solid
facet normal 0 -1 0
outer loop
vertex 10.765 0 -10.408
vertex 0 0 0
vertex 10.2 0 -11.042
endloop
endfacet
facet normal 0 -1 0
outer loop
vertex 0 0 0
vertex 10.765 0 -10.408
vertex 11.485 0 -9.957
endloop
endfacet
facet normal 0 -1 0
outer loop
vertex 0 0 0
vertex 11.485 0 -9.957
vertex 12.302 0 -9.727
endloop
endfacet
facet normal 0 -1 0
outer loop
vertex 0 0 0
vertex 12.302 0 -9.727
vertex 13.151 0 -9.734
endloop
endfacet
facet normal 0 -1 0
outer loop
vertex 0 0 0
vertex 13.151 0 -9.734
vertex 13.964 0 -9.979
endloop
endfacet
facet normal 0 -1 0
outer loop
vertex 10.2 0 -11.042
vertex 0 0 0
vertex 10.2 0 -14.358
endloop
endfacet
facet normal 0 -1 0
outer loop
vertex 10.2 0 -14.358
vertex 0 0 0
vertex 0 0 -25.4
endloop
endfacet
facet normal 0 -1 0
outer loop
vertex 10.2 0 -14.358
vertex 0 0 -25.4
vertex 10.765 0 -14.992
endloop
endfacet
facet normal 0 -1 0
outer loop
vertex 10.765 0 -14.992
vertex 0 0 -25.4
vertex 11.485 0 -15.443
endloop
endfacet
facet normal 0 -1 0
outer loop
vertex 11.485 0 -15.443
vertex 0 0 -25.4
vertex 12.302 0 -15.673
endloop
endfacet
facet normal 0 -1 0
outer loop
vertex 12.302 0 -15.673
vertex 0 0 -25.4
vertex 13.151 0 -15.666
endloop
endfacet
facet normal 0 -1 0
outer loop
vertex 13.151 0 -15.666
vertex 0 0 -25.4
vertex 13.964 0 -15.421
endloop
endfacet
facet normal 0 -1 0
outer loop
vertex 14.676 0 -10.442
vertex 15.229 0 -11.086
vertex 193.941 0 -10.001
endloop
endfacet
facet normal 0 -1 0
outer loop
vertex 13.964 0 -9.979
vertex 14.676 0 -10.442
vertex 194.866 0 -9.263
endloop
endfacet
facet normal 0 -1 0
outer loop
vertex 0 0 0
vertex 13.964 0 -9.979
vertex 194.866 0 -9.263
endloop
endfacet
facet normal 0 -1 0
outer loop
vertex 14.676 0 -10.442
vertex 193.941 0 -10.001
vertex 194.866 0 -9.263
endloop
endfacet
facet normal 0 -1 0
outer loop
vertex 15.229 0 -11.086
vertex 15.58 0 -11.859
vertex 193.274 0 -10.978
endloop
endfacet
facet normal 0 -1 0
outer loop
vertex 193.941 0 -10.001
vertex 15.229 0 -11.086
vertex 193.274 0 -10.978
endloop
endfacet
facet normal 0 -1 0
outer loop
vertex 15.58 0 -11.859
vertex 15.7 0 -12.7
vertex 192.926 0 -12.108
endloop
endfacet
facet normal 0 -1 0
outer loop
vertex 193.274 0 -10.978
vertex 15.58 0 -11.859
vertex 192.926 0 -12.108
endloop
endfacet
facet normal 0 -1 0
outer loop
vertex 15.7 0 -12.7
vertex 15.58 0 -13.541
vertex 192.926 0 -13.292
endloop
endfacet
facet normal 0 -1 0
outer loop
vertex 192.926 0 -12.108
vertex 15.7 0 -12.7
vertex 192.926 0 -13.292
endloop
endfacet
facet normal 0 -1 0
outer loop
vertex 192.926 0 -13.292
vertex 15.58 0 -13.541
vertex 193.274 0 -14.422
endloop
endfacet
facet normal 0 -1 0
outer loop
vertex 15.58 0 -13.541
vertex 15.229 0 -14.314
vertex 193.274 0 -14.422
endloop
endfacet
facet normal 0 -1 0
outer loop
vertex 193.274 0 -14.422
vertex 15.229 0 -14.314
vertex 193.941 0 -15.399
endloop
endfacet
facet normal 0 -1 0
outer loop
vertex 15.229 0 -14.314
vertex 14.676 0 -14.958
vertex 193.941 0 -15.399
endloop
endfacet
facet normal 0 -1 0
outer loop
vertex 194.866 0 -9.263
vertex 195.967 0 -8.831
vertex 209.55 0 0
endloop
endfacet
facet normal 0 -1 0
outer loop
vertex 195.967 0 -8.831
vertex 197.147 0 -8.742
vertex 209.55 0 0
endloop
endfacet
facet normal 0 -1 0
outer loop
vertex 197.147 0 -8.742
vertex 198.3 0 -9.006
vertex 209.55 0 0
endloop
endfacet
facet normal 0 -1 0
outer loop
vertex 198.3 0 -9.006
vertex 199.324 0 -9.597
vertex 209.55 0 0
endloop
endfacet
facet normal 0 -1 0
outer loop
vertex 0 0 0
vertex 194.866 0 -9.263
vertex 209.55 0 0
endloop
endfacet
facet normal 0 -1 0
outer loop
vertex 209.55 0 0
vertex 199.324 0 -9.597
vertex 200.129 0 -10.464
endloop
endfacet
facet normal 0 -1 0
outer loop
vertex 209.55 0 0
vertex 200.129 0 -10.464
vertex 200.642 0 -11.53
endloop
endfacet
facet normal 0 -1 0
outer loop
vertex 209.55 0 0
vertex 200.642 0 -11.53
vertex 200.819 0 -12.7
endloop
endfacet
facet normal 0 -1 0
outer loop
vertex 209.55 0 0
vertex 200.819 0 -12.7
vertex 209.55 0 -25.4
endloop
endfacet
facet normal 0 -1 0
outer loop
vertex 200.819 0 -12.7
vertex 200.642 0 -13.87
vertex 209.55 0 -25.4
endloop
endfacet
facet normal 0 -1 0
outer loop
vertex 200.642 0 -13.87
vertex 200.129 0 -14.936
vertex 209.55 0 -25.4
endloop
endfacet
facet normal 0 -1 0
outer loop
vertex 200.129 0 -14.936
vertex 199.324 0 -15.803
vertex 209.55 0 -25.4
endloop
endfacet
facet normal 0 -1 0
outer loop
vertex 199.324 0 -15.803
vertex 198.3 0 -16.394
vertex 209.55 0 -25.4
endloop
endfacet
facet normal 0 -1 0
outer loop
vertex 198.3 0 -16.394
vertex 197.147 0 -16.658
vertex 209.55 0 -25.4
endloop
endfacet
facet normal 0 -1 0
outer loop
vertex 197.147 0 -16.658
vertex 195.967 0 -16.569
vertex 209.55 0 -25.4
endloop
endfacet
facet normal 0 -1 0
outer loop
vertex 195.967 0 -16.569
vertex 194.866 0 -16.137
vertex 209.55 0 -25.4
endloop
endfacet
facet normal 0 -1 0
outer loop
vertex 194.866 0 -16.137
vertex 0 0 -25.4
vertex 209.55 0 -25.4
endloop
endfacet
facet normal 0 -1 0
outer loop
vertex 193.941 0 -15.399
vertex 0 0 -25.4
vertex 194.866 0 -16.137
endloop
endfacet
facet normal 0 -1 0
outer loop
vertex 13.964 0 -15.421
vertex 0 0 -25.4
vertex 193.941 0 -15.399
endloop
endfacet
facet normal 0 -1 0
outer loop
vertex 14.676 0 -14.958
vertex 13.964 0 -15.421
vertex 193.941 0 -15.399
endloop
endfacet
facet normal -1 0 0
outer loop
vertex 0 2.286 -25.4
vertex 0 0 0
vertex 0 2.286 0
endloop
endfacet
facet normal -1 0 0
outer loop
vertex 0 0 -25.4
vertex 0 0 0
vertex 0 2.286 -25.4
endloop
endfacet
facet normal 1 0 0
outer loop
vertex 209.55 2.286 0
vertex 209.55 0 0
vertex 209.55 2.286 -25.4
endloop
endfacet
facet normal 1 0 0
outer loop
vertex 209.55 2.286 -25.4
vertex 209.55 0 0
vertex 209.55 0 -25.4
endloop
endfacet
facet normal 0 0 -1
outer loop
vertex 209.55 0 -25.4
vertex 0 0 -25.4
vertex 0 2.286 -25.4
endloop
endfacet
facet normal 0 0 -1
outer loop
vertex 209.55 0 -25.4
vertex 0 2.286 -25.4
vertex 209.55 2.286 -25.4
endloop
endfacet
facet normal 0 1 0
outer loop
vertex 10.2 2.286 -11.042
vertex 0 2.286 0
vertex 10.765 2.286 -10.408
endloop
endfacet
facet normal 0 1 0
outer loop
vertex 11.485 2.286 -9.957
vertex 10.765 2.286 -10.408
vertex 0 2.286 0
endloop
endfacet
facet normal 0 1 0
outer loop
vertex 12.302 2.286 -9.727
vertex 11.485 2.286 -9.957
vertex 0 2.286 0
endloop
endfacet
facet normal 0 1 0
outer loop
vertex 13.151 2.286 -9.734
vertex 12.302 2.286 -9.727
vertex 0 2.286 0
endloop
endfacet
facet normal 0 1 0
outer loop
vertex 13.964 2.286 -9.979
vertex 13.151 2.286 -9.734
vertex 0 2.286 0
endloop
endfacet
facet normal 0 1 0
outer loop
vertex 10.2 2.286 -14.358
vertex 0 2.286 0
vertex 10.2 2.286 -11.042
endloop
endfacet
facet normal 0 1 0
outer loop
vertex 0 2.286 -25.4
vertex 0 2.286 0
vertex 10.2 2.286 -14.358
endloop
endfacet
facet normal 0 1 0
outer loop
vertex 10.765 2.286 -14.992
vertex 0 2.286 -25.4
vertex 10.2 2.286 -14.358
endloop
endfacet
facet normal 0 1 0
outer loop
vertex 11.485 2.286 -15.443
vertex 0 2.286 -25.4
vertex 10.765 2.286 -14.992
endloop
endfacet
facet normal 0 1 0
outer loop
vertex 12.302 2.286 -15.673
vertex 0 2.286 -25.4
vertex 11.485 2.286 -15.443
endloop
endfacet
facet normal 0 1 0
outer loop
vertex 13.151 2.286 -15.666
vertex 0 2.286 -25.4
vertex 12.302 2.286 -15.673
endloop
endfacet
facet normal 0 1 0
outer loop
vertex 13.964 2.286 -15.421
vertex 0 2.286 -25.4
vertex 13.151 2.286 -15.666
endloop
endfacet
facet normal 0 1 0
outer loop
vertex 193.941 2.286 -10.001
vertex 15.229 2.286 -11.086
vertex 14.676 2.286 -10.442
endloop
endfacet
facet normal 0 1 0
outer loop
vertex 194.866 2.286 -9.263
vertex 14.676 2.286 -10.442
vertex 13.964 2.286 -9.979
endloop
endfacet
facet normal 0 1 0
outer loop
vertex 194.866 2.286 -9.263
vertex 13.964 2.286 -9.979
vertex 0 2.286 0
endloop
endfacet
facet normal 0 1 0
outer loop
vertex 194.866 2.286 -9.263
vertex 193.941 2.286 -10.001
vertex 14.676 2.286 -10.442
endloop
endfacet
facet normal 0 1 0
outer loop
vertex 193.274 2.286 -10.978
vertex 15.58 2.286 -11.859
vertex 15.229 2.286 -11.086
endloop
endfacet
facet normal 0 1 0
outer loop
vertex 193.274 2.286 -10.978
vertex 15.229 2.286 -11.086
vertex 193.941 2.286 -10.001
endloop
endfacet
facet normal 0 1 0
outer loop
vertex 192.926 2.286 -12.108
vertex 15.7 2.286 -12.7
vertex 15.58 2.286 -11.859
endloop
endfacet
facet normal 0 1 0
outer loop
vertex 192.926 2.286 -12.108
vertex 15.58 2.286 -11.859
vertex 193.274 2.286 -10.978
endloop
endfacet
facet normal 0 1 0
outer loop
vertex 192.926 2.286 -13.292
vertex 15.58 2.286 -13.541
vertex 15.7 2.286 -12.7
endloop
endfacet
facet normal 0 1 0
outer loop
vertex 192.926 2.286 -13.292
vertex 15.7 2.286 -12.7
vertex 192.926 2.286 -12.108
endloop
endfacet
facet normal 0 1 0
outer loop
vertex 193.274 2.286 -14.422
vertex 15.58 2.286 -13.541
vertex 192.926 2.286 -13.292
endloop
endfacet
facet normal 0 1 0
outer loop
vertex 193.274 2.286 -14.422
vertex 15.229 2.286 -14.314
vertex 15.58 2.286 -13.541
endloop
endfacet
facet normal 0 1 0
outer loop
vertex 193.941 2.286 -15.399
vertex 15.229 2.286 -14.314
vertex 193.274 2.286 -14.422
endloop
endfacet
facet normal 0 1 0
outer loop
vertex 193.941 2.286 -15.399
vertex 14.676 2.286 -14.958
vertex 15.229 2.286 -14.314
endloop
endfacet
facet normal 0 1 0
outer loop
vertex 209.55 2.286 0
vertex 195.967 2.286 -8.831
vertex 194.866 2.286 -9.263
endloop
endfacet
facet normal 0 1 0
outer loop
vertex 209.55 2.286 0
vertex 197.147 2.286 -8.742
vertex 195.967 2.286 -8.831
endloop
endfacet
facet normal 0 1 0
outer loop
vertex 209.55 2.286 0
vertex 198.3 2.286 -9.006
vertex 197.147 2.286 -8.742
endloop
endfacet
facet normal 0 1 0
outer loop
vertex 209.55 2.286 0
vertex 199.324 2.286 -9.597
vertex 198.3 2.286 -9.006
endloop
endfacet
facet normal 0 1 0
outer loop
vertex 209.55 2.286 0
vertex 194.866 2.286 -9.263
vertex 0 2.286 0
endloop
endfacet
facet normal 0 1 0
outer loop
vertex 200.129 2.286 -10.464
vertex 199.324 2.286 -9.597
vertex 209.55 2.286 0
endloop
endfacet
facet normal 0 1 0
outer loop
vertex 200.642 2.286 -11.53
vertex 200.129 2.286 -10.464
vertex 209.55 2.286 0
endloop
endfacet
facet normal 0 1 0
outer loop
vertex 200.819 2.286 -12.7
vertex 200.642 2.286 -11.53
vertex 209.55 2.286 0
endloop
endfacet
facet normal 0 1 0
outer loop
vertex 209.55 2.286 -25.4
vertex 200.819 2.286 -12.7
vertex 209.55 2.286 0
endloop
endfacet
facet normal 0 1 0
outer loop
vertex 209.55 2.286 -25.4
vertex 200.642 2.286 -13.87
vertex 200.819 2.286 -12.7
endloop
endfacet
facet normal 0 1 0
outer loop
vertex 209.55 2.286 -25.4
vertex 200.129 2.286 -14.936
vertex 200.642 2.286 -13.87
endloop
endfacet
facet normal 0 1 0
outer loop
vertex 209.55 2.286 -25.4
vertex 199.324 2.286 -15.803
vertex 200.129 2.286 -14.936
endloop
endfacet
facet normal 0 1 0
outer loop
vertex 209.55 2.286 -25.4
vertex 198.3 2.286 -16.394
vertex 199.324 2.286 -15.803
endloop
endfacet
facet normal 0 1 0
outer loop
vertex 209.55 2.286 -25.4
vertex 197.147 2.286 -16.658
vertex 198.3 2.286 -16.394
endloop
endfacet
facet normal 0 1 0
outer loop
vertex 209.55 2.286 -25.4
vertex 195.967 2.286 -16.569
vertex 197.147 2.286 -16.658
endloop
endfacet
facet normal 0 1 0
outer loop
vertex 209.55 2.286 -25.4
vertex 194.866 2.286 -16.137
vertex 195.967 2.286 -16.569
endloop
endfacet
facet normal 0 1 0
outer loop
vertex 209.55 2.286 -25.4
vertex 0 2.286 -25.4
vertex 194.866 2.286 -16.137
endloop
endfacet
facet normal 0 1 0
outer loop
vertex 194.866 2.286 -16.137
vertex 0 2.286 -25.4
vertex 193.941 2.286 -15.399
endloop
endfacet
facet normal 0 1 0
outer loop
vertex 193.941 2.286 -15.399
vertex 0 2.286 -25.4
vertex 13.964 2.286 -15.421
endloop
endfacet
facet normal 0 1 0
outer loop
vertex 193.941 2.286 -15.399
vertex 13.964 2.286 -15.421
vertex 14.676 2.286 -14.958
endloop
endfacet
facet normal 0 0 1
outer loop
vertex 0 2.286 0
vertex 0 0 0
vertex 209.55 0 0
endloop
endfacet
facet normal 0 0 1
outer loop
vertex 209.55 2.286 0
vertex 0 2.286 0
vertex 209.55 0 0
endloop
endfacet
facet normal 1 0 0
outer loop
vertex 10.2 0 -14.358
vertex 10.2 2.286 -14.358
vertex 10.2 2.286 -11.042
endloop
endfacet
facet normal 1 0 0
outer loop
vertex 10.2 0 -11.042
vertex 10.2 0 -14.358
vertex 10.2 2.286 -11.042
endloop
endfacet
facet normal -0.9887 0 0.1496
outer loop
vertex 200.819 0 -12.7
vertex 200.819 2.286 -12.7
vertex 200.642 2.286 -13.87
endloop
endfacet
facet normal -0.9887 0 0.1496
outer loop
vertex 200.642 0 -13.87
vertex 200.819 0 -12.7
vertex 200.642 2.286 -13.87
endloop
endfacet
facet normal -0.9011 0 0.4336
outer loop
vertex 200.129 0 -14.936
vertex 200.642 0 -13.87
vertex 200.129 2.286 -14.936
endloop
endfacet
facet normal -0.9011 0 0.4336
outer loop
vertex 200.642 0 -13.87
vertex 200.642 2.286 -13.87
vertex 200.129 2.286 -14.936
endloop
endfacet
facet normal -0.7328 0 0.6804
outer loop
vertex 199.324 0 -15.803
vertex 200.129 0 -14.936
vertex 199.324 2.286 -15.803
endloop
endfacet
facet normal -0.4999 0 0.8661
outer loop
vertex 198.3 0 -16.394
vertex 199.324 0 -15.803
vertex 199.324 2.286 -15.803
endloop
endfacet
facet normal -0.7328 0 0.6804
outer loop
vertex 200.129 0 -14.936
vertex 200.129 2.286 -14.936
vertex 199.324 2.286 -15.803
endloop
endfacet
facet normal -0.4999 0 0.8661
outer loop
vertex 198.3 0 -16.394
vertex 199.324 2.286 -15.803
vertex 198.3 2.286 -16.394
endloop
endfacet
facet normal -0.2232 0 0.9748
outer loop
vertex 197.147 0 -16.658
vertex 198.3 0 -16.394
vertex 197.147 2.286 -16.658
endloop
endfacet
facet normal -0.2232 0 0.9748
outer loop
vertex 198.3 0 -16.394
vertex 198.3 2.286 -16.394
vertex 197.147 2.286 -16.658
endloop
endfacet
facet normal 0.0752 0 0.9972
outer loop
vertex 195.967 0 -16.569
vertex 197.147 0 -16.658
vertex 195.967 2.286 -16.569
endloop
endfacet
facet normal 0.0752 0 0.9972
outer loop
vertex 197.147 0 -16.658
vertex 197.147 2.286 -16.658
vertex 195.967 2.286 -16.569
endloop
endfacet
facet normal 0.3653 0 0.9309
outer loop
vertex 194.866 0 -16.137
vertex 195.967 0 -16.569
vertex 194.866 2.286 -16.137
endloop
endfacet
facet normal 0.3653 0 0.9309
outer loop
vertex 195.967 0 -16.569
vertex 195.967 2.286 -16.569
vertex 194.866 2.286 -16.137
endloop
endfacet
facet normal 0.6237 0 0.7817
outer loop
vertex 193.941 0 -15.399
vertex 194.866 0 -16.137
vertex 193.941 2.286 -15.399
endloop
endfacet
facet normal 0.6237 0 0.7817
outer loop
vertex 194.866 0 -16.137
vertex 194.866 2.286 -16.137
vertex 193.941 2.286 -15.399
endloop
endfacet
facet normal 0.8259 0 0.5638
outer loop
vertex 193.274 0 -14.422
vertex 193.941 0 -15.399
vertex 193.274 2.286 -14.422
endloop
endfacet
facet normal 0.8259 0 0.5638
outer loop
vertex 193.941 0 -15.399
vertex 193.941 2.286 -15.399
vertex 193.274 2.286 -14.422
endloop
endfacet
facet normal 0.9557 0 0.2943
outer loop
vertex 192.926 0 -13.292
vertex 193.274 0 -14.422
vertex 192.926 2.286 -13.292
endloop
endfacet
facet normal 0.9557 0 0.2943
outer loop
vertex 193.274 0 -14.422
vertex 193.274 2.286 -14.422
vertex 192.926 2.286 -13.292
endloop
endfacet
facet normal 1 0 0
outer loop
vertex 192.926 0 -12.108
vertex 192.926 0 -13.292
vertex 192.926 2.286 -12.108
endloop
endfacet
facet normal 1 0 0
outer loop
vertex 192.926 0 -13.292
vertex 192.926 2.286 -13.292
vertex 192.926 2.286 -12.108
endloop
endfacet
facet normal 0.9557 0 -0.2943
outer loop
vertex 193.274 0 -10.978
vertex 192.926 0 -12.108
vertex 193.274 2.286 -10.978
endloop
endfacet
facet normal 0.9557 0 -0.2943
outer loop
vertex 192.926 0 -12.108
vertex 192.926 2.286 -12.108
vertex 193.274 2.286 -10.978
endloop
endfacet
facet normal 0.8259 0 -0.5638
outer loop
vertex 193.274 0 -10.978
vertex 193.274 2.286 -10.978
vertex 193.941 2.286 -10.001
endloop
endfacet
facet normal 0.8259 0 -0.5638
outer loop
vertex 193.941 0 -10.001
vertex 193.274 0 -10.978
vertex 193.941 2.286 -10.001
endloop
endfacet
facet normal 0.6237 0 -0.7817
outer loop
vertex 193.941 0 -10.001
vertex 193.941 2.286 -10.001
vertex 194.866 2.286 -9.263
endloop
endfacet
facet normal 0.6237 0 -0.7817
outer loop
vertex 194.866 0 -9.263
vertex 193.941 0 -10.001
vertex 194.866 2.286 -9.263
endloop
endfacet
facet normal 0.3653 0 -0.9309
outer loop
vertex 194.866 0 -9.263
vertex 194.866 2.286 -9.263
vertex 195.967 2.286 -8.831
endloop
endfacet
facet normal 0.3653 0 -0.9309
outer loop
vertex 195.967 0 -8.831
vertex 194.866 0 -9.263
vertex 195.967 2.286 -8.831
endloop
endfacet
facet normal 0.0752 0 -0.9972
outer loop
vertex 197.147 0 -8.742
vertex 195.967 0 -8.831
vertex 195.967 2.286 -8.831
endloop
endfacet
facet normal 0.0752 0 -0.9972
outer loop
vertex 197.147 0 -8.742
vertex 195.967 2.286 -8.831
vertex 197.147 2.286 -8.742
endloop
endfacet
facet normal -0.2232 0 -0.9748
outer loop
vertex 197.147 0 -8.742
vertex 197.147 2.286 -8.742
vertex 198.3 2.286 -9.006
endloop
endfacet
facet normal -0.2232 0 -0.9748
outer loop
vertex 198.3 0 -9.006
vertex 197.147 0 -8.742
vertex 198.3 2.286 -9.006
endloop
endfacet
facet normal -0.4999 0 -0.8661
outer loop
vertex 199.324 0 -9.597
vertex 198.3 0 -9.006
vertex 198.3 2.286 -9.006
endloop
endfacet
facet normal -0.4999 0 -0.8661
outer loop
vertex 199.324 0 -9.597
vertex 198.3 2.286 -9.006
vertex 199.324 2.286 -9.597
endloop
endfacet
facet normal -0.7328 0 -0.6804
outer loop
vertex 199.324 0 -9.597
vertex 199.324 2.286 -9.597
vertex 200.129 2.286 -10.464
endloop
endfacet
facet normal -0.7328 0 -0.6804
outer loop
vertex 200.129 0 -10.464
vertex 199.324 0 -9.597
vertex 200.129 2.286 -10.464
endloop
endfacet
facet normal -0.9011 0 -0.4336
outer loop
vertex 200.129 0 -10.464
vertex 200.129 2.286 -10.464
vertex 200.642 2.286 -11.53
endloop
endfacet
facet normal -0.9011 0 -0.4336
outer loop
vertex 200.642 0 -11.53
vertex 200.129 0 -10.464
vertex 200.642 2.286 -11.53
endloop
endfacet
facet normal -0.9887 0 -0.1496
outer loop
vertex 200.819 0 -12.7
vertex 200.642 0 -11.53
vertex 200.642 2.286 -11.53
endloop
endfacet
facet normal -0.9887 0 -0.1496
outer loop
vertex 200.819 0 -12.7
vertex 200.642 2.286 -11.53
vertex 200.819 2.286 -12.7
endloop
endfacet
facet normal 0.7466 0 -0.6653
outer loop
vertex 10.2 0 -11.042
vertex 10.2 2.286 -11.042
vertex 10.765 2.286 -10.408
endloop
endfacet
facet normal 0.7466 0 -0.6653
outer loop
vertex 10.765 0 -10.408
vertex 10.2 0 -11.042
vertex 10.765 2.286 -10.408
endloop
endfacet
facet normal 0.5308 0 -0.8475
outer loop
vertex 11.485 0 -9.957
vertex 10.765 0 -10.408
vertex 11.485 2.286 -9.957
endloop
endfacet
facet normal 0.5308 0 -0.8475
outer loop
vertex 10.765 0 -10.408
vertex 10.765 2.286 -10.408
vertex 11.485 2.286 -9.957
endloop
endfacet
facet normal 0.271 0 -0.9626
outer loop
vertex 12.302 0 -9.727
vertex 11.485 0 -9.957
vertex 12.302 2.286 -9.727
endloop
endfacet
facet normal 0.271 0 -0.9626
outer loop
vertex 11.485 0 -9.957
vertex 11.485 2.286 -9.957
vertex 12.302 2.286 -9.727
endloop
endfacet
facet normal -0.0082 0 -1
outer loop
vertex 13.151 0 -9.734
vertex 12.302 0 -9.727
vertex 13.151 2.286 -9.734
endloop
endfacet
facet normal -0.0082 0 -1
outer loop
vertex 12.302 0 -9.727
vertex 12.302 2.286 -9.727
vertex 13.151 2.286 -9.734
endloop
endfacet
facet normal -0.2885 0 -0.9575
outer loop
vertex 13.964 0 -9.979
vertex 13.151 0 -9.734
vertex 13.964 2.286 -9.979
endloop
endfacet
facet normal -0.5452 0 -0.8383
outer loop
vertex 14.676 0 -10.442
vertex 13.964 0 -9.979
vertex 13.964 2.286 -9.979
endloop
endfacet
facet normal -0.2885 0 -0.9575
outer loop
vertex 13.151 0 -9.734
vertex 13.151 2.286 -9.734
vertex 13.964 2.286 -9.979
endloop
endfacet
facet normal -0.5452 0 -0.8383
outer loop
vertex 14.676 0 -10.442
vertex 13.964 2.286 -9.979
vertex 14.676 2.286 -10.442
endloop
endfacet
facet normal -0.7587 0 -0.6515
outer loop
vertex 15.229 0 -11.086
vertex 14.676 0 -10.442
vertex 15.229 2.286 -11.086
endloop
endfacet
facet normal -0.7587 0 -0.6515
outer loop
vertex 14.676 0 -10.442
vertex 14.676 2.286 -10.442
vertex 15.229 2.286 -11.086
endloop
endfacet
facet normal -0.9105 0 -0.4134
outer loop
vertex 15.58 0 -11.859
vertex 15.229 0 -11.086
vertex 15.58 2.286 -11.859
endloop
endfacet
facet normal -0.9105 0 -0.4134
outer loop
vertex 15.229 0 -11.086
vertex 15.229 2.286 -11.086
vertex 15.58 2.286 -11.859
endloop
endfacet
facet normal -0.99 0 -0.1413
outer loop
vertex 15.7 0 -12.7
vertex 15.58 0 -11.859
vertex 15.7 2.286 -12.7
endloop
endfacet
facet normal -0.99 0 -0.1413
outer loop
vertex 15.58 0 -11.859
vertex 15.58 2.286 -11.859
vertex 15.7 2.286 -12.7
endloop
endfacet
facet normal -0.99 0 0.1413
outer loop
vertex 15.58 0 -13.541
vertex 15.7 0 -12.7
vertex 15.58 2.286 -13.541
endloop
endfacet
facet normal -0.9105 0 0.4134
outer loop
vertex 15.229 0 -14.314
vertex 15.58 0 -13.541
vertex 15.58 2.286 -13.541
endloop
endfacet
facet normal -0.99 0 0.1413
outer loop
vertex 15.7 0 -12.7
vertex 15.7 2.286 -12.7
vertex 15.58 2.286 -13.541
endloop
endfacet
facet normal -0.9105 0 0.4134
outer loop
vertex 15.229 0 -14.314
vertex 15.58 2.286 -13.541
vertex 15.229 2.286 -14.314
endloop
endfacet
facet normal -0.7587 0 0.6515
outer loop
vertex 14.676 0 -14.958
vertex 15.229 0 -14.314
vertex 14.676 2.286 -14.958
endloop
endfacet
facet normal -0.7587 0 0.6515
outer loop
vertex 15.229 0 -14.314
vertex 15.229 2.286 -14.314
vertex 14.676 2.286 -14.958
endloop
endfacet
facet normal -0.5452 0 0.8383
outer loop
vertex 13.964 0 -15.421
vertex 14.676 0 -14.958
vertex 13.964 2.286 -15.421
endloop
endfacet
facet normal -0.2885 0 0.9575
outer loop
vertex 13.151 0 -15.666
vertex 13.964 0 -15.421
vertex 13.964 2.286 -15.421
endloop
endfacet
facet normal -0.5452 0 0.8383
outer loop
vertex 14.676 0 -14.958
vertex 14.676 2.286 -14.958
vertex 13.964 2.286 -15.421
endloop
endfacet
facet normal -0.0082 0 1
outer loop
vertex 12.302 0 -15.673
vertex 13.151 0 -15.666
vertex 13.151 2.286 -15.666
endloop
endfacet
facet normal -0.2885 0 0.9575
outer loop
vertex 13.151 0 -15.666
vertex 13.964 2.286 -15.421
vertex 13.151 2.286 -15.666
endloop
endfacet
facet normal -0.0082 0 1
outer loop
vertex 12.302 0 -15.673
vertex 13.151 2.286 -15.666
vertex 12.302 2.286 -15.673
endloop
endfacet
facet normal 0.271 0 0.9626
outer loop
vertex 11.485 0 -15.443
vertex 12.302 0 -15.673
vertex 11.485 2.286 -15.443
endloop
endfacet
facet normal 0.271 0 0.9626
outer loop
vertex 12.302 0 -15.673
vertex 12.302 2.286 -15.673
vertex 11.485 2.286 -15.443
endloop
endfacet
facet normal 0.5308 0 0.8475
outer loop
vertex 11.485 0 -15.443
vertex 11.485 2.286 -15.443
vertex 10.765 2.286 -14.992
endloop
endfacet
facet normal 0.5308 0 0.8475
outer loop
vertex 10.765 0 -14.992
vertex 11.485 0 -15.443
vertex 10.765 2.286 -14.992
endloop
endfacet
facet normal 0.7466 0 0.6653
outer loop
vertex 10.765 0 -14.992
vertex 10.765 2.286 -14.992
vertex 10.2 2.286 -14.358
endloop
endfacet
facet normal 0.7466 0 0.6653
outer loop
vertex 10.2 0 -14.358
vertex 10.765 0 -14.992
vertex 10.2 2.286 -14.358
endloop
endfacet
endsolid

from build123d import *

# Parameters (mm, degrees)
SKETCH1_W           = 209.55
SKETCH1_H           = 25.4
BOSS_EXTRUDE1_DEPTH = 2.286
SKETCH2_R           = 3.96875
CUT_EXTRUDE1_DEPTH  = 3.286


with BuildPart() as part:
    # Sketch1 → Boss-Extrude1 (new body)
    with BuildSketch(Plane(origin=(0, 0, 0), x_dir=(1, 0, 0), z_dir=(0, 1, 0))):
        with Locations((104.775, 12.7)):
            Rectangle(SKETCH1_W, SKETCH1_H)
    extrude(amount=BOSS_EXTRUDE1_DEPTH)

    # Sketch2 → Cut-Extrude1 (cut, through all)
    with BuildSketch(Plane(origin=(0, 2.286, 0), x_dir=(1, 0, 0), z_dir=(0, 1, 0))):
        with Locations((196.85, 12.7)):
            Circle(SKETCH2_R)
        with BuildLine():
            Line((10.2, 14.358312395), (10.2, 11.041687605))
            ThreePointArc((10.2, 11.041687605), (15.7, 12.7), (10.2, 14.358312395))
        make_face()
    extrude(amount=-CUT_EXTRUDE1_DEPTH, mode=Mode.SUBTRACT)


solid = part.part
